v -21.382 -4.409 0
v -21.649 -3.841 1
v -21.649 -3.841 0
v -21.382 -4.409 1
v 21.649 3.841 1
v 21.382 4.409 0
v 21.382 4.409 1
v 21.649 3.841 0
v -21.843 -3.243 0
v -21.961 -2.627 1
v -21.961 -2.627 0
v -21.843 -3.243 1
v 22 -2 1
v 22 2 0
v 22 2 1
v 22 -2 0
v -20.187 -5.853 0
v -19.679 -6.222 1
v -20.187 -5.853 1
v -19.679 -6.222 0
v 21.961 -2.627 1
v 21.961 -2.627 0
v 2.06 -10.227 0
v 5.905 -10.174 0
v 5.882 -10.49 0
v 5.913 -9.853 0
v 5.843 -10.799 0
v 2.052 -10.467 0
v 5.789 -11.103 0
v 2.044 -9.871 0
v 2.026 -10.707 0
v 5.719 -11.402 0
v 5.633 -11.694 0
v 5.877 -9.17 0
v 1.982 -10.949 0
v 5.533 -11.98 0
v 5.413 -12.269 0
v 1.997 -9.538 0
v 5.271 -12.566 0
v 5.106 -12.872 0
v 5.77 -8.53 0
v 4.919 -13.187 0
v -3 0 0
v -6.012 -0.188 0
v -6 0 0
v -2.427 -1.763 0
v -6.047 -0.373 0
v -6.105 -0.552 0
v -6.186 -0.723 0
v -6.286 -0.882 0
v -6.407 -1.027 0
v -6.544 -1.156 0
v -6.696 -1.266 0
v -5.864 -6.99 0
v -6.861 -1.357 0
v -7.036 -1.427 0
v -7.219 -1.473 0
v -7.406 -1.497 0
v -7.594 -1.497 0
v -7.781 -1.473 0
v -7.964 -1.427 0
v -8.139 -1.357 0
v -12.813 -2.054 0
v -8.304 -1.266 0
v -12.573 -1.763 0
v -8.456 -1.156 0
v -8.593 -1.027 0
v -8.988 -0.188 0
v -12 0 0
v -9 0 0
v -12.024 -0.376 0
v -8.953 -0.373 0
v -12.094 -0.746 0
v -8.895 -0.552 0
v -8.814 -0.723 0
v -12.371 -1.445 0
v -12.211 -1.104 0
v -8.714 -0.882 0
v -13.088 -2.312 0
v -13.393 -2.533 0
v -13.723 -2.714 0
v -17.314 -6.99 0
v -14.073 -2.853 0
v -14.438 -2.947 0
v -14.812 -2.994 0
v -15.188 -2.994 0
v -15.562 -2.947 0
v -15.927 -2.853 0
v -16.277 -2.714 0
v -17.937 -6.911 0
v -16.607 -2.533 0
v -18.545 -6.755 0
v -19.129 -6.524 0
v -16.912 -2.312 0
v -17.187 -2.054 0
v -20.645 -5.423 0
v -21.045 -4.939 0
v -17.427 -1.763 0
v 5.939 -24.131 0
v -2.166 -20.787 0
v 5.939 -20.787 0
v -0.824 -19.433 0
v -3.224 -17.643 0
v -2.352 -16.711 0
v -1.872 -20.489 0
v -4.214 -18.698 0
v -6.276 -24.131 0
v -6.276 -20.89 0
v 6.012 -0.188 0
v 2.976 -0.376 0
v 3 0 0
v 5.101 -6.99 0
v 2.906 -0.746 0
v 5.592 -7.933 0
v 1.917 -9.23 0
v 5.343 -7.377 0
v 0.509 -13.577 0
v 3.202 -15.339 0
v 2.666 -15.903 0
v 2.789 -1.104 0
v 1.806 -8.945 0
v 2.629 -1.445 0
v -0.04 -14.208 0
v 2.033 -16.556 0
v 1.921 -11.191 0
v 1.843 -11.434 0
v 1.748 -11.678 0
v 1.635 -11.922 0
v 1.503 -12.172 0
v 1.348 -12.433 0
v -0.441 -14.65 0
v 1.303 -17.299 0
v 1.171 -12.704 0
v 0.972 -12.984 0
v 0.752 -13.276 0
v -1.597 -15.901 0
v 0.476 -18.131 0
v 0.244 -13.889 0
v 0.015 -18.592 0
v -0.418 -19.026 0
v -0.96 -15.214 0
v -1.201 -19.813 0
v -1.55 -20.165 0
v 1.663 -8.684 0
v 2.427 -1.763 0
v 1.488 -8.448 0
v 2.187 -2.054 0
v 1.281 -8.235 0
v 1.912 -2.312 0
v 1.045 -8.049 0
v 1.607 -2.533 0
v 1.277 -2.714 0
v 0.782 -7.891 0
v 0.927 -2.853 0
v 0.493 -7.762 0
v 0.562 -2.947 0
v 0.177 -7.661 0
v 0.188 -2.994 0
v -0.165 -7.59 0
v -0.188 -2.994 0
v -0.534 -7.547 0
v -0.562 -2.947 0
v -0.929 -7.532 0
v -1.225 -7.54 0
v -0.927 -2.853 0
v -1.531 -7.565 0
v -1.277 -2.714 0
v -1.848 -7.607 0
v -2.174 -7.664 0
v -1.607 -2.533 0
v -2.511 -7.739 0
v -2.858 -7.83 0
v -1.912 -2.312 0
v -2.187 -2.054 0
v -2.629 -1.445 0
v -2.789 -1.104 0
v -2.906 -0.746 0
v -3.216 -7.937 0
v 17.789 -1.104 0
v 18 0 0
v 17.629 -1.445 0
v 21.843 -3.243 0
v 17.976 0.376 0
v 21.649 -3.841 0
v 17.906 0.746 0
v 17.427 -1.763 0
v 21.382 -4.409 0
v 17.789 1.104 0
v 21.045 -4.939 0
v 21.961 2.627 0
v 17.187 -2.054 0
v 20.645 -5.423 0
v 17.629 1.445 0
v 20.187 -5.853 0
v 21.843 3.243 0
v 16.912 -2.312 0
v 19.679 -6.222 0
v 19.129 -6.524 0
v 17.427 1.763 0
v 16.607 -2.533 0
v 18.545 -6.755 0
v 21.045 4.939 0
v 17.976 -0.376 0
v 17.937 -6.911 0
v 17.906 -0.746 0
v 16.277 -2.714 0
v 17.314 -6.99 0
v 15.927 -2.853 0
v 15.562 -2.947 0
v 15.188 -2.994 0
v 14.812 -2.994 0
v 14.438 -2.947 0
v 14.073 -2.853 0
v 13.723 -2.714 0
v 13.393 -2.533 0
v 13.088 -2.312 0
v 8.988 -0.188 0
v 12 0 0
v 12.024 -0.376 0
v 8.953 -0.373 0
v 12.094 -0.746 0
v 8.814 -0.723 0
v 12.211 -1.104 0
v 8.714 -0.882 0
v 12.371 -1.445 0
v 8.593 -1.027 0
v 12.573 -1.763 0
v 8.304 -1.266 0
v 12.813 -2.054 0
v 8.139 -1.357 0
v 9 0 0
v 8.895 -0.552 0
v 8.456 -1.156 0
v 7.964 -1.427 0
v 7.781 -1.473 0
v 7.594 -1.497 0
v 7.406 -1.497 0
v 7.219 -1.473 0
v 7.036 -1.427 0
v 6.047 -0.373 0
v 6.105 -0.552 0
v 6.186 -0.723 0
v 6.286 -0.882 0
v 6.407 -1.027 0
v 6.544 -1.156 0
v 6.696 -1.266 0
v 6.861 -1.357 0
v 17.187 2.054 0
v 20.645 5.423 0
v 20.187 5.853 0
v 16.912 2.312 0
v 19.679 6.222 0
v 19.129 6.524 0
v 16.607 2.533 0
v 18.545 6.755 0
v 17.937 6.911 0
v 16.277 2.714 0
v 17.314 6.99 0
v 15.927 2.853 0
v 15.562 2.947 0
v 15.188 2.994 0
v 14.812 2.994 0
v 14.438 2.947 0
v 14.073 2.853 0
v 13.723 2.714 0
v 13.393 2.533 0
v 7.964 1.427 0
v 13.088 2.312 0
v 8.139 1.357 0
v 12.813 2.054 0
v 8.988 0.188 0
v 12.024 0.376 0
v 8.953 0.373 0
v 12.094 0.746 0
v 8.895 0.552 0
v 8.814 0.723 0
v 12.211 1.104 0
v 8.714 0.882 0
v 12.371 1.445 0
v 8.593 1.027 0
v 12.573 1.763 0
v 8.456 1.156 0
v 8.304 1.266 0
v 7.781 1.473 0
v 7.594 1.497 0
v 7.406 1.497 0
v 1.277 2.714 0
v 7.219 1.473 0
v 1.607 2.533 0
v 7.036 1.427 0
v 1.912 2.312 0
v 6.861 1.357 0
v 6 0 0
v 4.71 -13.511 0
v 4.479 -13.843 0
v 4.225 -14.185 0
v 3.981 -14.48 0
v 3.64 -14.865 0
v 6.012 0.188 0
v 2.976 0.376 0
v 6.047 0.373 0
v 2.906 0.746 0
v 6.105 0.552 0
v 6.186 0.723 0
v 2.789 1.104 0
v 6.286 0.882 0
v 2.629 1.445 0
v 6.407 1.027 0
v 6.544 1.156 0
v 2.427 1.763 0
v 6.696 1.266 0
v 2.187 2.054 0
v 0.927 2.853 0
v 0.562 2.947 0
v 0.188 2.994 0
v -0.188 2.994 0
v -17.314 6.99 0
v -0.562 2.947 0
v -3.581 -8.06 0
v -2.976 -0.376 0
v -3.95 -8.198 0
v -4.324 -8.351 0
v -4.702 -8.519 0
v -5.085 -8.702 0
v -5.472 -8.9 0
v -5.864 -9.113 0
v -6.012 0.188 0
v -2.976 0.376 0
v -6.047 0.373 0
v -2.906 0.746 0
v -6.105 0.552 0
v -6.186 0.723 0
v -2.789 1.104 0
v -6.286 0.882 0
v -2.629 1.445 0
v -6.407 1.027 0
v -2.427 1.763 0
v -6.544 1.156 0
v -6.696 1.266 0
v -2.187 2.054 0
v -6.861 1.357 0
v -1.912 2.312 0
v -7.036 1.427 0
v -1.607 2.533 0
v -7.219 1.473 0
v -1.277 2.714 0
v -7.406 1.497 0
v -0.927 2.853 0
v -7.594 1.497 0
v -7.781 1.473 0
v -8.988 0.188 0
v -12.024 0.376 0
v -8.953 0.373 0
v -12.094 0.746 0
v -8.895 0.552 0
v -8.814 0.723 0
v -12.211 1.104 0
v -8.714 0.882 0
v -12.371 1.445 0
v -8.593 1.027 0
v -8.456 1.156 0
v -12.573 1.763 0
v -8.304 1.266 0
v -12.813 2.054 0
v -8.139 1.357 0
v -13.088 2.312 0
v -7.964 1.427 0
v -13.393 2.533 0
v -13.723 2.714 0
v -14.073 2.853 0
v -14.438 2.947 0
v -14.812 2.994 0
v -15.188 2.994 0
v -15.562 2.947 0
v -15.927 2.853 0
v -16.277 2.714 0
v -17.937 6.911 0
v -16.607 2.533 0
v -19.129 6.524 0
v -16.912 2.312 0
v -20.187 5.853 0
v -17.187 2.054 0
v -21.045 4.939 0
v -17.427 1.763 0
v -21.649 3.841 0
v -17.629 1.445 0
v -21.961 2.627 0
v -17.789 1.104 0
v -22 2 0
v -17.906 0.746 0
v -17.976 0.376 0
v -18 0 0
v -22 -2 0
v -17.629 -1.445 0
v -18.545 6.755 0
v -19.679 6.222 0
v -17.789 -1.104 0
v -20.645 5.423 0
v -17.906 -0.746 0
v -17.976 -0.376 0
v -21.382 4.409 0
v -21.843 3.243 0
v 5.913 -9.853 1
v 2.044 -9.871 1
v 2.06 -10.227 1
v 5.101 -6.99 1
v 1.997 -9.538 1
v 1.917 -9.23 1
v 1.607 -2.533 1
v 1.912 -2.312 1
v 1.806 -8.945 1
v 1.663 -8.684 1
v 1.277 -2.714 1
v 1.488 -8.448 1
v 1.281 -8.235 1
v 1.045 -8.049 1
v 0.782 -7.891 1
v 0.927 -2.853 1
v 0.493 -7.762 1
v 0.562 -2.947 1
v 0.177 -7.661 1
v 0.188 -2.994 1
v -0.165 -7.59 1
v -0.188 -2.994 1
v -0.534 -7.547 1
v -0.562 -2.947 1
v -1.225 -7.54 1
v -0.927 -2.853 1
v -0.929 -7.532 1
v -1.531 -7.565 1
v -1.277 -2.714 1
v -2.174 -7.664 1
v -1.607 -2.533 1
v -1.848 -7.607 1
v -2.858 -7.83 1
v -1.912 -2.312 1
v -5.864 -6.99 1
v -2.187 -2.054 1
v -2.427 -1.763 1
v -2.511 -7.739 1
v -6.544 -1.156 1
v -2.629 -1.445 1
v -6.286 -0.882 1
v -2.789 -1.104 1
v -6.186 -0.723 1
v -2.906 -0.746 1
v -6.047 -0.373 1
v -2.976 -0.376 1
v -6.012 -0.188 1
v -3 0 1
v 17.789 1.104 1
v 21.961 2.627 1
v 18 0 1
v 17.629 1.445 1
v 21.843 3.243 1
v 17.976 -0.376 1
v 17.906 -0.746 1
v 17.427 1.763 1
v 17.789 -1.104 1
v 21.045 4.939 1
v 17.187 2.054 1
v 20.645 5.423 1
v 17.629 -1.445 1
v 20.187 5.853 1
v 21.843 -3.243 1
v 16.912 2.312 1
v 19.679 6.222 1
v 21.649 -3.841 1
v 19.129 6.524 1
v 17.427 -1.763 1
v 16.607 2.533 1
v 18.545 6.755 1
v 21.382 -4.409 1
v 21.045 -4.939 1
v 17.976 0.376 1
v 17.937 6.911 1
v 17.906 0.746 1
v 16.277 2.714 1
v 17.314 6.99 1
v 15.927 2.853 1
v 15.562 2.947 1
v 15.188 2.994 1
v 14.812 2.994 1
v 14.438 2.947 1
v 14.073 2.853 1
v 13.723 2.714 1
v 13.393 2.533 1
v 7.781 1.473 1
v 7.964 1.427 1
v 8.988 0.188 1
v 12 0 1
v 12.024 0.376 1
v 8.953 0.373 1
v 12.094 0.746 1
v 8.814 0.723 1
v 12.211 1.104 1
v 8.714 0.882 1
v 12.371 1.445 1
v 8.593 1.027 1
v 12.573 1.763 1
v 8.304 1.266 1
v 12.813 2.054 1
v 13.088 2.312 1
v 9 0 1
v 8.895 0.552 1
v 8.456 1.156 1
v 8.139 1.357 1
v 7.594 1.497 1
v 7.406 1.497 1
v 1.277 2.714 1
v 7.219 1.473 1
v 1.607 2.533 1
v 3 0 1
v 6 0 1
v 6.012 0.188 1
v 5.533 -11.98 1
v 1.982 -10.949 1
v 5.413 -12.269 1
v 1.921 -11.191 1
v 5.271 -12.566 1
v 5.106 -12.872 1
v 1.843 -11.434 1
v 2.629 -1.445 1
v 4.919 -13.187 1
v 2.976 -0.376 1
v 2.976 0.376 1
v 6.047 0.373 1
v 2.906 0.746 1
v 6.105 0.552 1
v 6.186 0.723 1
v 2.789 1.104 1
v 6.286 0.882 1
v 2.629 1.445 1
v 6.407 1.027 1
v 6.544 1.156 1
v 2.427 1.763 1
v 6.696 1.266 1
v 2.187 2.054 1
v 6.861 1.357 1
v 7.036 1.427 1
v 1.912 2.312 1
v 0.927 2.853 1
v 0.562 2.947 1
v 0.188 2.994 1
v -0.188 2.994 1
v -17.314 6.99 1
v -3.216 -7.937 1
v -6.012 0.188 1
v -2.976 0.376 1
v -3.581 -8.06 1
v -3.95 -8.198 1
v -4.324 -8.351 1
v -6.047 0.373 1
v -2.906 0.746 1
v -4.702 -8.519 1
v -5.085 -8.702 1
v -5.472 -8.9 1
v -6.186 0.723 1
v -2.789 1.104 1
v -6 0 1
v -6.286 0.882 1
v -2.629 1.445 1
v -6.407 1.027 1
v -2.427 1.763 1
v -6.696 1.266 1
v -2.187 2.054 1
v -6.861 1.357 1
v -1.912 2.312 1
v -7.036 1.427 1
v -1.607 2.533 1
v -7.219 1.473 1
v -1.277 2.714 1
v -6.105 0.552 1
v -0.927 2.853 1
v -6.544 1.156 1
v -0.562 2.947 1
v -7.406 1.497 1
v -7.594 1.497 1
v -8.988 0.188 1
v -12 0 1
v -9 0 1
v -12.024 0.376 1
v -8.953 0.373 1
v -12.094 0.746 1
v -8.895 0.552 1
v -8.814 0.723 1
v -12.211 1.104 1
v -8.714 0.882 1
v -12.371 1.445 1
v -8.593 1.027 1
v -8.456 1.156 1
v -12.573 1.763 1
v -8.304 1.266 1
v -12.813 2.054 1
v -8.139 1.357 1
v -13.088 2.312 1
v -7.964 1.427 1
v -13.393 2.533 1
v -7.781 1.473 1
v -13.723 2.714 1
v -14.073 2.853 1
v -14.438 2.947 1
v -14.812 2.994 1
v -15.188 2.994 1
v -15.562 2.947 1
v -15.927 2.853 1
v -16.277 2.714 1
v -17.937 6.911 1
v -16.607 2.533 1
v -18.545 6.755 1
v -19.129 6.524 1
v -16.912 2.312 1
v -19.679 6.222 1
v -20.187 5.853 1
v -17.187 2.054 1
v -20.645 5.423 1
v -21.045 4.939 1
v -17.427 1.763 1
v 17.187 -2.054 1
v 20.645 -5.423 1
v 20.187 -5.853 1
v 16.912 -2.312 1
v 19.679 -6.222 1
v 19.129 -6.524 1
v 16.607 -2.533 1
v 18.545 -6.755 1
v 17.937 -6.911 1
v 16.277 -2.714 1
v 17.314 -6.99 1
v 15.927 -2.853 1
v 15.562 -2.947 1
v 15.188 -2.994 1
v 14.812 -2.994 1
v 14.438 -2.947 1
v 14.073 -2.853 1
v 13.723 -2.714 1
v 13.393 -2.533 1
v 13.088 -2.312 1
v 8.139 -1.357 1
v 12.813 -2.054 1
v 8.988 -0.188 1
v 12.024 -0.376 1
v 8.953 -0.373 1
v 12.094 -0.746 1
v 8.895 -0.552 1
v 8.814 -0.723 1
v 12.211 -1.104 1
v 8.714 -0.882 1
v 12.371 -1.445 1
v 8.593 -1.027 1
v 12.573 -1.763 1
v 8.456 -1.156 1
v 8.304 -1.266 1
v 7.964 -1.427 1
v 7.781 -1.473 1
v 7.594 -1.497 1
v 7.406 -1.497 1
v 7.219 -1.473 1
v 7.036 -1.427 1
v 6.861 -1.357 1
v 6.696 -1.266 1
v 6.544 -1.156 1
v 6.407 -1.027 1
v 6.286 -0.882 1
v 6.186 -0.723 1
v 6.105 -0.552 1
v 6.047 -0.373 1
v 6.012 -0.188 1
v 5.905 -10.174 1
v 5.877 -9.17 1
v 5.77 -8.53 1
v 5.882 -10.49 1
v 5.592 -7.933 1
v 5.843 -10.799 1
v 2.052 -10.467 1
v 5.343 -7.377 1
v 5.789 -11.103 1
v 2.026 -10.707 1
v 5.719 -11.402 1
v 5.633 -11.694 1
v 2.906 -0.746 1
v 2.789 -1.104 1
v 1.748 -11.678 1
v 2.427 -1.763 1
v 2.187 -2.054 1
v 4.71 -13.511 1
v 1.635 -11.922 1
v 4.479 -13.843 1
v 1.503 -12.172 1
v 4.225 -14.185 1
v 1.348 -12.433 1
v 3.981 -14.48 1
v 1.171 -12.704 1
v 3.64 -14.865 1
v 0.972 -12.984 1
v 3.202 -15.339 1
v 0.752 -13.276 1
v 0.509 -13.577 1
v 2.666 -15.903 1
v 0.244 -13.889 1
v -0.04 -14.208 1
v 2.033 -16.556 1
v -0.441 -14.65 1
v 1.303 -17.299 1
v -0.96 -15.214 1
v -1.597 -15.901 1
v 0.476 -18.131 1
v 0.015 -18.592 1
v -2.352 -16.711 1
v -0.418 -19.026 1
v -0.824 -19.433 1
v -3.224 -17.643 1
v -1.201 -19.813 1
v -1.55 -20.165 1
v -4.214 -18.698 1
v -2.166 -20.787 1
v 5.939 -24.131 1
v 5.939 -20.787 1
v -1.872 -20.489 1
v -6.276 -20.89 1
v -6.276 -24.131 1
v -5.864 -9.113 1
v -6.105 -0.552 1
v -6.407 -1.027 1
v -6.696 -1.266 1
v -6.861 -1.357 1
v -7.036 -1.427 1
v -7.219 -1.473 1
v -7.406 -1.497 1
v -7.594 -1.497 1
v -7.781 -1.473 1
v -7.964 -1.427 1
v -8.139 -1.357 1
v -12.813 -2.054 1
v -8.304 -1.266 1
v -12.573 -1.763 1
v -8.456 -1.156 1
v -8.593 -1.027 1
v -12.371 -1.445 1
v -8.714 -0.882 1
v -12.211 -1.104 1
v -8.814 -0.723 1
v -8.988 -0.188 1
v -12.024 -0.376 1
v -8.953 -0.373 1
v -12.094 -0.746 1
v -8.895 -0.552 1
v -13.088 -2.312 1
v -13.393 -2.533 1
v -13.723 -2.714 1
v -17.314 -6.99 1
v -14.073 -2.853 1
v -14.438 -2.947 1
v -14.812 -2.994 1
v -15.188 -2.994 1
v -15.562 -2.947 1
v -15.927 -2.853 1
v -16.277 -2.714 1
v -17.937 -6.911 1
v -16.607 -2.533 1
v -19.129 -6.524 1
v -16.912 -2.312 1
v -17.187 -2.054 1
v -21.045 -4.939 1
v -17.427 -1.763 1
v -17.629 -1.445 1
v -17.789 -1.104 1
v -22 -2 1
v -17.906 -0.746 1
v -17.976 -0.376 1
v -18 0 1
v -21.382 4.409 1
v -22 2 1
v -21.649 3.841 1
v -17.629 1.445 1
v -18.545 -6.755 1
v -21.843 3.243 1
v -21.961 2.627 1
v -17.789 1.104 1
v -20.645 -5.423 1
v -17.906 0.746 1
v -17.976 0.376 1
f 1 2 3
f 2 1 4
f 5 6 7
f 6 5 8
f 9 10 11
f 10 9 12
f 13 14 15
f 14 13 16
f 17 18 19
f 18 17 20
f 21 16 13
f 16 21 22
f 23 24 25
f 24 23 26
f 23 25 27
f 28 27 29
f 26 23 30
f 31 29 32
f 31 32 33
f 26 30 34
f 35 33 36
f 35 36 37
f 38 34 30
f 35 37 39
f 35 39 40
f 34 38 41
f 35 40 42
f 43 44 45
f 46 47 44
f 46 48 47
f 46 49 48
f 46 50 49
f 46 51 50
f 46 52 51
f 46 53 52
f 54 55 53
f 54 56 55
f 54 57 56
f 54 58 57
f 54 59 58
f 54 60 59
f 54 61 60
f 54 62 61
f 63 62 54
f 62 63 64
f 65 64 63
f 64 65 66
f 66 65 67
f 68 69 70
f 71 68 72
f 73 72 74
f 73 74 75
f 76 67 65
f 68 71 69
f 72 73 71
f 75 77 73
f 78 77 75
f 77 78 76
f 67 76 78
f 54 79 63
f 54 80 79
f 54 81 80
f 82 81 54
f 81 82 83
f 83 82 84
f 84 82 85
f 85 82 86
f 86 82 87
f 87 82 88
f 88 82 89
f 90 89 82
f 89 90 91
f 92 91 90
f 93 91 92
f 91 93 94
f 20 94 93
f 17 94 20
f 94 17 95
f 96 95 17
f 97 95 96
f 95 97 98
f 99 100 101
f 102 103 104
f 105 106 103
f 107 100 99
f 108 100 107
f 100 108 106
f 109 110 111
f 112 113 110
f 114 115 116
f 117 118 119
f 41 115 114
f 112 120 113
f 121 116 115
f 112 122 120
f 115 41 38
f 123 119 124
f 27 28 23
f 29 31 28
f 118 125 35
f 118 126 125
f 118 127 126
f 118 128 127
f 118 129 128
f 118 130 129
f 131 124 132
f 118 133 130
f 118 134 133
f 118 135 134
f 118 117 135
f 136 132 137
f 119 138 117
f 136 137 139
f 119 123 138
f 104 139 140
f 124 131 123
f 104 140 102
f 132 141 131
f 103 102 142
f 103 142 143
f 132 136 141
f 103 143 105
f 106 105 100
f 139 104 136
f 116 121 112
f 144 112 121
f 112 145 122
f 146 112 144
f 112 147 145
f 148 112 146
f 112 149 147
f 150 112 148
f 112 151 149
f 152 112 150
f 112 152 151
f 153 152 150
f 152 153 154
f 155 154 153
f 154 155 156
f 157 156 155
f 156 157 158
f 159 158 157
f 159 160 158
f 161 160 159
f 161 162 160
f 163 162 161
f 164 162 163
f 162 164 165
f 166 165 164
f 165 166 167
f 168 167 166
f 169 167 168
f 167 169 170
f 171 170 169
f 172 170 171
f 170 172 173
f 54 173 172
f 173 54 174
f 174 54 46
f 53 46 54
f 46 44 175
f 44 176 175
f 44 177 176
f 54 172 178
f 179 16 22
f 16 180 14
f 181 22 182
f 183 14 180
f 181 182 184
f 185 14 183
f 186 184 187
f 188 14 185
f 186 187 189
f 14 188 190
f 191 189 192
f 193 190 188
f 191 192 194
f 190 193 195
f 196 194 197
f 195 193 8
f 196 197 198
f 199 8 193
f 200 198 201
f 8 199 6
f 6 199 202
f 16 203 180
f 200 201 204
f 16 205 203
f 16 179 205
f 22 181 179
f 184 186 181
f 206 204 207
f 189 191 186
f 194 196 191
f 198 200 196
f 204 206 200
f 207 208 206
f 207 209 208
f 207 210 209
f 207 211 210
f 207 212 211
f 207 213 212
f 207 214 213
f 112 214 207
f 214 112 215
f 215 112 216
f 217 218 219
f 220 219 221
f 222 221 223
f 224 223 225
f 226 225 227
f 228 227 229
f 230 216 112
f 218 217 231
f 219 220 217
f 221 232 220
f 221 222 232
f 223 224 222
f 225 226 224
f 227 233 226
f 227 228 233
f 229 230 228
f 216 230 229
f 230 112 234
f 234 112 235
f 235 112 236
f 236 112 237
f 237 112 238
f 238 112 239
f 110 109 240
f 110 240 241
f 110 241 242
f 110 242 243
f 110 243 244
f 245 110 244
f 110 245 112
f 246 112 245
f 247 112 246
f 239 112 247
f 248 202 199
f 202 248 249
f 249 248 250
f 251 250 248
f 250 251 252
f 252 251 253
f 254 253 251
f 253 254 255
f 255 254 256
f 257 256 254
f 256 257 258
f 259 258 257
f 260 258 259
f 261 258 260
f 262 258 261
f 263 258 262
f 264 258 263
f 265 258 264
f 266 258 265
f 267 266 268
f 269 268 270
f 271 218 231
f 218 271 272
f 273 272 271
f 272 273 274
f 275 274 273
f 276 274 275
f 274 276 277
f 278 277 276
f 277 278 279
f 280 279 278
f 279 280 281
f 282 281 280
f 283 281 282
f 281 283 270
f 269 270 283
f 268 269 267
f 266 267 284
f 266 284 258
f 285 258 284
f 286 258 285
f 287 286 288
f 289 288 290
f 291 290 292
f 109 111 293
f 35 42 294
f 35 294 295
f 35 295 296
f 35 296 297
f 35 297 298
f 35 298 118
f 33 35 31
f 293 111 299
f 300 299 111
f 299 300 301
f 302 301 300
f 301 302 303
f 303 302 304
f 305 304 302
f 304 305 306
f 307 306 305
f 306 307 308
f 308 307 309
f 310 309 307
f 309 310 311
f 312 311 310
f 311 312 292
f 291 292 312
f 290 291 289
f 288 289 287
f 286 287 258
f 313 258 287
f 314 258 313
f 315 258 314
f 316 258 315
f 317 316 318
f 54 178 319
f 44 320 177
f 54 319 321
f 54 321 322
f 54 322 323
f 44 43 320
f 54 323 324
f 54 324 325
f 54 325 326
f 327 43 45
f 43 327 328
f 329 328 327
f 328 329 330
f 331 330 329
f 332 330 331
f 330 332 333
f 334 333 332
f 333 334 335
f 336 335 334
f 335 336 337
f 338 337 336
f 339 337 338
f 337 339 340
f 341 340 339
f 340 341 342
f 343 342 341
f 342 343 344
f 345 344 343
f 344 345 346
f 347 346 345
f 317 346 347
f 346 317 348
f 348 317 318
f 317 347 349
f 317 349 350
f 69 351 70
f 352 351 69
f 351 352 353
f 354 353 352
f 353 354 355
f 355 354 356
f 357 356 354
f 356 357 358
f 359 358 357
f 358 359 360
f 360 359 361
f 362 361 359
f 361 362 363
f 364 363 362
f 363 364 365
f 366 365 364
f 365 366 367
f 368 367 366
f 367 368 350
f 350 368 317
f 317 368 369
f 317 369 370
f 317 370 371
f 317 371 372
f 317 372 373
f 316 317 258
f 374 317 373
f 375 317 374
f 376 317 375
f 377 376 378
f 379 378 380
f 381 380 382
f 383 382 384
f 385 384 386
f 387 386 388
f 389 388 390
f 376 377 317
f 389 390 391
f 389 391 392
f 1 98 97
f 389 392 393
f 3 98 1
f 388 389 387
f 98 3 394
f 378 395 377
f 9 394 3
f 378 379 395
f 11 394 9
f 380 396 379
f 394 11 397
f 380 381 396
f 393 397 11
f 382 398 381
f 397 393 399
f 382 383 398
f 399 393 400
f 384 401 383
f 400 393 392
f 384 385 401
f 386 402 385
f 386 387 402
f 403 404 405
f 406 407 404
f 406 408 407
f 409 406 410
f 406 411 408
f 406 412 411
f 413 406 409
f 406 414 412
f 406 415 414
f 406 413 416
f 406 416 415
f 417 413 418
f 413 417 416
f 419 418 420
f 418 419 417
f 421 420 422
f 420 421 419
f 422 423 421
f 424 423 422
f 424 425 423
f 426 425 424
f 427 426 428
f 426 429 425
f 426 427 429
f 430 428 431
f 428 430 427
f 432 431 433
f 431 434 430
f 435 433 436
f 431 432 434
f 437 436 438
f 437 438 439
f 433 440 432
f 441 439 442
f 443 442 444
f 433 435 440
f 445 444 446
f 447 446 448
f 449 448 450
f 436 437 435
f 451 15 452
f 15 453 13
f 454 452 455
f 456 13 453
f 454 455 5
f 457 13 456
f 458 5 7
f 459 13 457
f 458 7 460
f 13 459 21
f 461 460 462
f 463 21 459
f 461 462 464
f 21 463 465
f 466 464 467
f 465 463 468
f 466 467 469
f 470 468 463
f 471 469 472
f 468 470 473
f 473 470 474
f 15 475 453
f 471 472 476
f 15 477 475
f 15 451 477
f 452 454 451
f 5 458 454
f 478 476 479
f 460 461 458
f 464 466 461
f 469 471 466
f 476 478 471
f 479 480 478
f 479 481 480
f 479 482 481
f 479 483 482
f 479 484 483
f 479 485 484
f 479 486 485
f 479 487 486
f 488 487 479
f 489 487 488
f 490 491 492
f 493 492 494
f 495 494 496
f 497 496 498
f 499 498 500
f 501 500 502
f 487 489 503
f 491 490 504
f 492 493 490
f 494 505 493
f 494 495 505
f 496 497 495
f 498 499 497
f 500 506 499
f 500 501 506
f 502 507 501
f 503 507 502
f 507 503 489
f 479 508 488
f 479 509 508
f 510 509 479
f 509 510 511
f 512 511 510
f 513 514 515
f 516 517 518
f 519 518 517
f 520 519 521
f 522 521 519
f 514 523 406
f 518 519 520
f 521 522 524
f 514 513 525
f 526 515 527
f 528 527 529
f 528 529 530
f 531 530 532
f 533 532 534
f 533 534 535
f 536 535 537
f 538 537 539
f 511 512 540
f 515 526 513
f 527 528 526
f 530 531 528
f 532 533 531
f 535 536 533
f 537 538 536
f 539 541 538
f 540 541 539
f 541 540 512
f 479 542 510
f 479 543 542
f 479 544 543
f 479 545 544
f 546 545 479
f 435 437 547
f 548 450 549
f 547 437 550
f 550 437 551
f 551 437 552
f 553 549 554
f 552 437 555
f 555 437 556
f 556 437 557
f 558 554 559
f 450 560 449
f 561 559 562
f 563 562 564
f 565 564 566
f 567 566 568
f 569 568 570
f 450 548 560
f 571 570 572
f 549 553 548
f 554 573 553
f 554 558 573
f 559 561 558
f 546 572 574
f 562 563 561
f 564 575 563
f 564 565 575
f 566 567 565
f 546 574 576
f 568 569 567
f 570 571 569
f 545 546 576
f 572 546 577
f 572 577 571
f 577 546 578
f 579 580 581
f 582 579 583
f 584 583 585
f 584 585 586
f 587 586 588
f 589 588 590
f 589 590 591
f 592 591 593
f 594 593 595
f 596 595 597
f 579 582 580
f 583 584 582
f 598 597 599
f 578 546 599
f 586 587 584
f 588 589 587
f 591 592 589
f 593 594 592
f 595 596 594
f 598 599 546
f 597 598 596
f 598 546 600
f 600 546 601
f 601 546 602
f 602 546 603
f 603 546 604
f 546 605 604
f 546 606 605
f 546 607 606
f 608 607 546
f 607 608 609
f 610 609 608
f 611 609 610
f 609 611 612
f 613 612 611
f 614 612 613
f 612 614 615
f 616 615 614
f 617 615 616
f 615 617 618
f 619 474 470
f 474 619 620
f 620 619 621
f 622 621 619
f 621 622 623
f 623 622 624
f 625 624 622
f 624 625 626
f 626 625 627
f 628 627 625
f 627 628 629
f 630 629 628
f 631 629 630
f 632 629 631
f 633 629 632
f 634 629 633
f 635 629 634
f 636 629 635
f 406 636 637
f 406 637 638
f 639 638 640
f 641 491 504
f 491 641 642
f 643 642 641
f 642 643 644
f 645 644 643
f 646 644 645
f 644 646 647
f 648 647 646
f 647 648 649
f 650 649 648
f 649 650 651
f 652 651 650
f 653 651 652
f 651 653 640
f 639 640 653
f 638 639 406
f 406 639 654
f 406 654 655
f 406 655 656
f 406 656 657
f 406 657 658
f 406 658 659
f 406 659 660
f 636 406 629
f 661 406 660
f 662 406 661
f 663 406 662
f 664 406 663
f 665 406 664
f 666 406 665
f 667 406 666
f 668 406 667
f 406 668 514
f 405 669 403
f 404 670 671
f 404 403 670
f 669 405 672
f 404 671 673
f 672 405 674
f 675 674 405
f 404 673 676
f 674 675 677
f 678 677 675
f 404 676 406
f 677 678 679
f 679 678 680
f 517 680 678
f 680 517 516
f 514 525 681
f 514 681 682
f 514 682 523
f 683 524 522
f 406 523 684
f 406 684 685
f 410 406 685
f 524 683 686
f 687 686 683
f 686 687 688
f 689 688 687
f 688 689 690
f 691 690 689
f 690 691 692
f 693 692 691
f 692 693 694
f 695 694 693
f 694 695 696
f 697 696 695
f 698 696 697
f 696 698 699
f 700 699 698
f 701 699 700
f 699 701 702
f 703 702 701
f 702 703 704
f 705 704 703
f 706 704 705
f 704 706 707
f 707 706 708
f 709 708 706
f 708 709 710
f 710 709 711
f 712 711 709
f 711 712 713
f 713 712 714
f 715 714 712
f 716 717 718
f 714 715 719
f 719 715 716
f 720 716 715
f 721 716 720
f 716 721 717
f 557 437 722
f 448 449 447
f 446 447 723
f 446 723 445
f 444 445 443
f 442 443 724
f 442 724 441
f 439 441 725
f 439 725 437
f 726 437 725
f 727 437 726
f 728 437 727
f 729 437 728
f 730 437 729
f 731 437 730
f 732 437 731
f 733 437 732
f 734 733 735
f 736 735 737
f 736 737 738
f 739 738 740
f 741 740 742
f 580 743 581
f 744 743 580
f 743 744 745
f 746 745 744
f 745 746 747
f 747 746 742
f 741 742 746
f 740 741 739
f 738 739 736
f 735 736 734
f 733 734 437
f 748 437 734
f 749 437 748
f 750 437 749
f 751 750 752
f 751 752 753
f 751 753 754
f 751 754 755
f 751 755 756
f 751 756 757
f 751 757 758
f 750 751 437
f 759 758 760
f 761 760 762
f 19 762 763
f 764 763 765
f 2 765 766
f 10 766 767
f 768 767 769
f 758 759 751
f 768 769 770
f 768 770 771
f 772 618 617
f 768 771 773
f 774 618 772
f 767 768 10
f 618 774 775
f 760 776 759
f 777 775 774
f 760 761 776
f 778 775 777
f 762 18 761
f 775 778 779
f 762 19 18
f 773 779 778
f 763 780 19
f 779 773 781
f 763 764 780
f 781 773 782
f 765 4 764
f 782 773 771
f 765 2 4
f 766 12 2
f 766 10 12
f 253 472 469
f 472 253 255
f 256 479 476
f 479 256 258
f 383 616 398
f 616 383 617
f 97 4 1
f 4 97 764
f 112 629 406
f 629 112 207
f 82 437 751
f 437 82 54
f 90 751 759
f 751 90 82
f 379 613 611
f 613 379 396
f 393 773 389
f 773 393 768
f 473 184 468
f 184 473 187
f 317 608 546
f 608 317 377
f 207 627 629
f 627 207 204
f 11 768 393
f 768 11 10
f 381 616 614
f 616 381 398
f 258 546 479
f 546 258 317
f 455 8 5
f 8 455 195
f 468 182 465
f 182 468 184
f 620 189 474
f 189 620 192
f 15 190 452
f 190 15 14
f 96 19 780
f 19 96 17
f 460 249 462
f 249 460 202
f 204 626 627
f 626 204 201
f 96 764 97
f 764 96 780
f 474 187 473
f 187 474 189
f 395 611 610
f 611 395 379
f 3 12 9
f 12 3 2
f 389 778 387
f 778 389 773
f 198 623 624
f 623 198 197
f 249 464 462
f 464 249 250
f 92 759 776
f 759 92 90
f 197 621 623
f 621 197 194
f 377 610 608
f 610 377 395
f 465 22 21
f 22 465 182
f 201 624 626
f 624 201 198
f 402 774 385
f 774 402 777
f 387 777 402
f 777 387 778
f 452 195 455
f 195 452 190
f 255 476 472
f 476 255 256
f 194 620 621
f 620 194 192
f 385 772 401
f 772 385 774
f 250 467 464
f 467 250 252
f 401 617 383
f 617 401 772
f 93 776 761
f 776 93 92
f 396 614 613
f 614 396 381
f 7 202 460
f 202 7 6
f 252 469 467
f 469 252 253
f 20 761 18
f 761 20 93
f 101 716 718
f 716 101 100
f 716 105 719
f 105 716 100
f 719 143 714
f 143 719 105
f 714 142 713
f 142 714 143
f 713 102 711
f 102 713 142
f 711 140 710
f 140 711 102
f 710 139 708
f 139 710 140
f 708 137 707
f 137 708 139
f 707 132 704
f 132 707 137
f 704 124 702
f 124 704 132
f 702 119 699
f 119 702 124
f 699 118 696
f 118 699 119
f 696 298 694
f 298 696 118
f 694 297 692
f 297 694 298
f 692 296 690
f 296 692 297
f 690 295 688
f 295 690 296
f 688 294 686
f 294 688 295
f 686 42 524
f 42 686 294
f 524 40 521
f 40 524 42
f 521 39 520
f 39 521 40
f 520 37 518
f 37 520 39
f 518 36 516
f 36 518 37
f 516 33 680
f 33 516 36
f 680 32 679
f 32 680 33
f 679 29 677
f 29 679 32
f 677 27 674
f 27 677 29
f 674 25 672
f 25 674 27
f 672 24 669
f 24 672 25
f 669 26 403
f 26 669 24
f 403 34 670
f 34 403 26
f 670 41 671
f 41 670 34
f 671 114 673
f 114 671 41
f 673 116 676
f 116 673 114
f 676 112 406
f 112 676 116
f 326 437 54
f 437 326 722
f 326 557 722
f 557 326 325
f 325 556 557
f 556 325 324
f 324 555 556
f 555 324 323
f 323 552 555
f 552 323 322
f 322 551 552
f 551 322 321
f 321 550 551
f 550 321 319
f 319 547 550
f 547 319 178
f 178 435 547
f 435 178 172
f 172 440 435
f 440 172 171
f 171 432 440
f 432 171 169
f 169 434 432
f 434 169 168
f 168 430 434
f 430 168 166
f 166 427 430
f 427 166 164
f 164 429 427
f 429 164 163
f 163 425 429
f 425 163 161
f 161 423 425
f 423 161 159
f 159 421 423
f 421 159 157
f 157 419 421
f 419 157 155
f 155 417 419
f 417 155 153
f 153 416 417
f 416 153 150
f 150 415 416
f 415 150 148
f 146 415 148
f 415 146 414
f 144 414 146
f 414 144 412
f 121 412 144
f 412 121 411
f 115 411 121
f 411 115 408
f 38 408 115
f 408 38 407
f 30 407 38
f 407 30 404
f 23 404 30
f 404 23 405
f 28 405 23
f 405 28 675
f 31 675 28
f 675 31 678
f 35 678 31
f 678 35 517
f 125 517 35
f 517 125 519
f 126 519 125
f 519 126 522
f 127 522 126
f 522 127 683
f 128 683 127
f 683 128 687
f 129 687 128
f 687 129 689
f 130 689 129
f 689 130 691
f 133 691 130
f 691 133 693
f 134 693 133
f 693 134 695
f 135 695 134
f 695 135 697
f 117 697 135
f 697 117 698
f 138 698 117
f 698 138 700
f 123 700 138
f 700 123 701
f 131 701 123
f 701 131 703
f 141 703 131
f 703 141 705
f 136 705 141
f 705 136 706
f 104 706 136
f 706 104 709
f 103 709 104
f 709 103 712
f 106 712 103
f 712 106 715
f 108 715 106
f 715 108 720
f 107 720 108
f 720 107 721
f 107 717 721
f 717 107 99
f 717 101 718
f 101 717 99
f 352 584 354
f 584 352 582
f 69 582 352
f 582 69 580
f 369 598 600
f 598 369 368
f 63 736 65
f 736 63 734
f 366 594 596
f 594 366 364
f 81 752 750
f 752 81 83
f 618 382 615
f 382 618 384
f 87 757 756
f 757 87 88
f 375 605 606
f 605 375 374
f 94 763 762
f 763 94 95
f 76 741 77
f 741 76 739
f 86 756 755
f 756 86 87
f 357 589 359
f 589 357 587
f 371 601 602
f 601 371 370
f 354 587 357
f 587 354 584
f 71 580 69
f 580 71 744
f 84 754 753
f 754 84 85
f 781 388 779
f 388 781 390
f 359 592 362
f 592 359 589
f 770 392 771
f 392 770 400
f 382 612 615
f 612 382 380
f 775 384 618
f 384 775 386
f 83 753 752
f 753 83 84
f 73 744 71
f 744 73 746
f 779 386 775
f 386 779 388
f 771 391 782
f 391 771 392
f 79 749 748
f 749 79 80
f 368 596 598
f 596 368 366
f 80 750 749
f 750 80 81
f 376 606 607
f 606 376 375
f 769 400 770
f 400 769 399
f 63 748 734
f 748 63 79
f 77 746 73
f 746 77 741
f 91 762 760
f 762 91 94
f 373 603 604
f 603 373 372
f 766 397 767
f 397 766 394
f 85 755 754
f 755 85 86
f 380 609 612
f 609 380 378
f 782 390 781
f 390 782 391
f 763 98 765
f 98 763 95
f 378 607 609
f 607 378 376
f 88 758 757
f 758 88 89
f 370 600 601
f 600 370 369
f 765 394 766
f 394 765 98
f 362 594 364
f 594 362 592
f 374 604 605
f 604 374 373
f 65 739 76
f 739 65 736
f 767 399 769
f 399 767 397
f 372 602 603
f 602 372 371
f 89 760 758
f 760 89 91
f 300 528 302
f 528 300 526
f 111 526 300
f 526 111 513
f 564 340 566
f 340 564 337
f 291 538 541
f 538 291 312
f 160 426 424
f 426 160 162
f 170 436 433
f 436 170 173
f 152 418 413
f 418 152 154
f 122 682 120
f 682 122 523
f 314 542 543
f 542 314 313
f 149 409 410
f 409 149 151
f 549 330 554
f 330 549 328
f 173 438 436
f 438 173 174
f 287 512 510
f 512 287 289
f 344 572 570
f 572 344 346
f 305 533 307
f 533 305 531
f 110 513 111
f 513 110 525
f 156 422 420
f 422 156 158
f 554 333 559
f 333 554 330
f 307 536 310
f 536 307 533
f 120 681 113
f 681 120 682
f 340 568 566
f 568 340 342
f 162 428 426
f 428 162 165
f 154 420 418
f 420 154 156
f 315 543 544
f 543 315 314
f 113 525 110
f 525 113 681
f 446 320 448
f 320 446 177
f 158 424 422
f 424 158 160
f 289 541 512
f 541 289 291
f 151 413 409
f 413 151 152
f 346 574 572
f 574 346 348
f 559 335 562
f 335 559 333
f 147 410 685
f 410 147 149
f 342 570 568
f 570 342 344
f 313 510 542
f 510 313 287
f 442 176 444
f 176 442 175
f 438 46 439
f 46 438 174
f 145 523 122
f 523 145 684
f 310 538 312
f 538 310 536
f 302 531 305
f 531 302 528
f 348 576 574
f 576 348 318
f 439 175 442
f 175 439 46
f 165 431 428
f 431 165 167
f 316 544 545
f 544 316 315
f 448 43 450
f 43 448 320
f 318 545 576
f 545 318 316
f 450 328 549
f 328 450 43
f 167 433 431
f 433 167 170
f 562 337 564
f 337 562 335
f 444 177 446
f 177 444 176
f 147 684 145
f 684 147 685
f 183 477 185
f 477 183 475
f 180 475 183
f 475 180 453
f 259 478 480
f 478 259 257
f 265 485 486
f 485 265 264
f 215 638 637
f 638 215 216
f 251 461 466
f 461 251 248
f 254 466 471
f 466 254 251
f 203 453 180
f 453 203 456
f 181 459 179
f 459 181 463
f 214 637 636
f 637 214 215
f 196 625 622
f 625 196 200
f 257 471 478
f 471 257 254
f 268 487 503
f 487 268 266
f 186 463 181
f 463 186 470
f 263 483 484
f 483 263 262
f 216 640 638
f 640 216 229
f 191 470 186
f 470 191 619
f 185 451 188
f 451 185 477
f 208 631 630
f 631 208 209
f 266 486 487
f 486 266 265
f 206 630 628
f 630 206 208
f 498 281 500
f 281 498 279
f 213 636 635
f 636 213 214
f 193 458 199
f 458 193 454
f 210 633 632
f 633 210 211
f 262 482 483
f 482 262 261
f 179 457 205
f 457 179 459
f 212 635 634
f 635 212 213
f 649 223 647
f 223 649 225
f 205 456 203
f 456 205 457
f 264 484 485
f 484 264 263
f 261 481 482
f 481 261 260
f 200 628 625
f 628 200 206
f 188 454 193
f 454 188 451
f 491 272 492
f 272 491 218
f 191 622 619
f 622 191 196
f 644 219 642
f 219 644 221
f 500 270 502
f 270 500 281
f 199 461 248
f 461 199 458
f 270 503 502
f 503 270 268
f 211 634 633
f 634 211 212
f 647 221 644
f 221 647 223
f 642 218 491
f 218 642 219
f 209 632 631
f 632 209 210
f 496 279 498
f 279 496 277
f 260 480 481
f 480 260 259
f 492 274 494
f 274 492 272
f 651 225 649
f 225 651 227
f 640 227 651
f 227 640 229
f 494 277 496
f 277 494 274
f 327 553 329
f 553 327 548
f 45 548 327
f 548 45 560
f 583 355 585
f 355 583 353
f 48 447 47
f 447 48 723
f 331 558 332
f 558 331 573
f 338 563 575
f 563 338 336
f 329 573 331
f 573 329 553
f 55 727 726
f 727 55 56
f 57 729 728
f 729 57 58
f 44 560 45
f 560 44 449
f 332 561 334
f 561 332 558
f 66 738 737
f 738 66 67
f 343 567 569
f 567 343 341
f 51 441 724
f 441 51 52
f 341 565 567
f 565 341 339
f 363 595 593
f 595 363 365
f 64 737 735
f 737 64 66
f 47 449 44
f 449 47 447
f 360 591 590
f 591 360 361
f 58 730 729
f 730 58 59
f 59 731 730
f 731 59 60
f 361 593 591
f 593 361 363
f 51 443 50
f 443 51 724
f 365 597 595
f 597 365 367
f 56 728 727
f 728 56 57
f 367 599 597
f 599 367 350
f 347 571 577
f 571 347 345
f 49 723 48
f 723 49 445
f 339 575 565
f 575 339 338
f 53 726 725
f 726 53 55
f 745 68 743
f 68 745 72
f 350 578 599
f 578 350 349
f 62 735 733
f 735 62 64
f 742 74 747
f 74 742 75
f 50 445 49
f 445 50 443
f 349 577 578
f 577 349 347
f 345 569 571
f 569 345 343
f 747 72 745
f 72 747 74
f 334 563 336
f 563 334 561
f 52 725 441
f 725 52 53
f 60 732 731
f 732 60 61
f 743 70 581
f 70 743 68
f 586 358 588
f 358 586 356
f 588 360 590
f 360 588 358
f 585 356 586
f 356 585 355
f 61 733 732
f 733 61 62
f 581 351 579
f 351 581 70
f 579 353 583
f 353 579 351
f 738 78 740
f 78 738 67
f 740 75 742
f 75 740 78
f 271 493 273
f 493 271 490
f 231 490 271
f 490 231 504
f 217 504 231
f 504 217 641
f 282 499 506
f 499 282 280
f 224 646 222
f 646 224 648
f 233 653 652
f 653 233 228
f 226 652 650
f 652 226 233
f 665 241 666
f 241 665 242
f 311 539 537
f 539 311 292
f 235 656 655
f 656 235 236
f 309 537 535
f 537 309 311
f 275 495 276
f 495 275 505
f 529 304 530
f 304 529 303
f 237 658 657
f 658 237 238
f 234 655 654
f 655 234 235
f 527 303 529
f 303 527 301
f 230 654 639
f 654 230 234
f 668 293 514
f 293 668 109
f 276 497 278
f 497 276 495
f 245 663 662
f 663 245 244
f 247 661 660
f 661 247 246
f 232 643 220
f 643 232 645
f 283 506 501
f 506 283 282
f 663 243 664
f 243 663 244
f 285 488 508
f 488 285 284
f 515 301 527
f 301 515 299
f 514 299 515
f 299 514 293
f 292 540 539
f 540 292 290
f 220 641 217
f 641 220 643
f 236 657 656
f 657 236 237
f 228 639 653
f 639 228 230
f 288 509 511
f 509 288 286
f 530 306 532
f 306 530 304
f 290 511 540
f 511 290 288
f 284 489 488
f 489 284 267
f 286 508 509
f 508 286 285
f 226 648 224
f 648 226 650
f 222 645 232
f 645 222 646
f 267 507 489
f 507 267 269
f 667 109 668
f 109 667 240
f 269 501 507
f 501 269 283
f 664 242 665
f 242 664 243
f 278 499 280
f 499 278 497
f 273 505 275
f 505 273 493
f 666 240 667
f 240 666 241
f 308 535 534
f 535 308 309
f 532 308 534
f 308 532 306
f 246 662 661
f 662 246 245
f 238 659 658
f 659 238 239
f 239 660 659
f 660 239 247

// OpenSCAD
$fn = 50;


difference() {
	union() {
		*color(alpha = 1.0000000000, c = "gray") {
			translate(v = [0, 14, 0]) {
				linear_extrude(height = 1) {
					text(font = "Arial:style=Bold", halign = "center", size = 4.5000000000, text = "COMMENT description oobb_plate_shape_p_type_1_depth_3_width_1_thickness_2_extra_oobb_size", valign = "center");
				}
			}
		}
		hull() {
			translate(v = [-17.0000000000, 2.0000000000, 0]) {
				cylinder(h = 1, r = 5);
			}
			translate(v = [17.0000000000, 2.0000000000, 0]) {
				cylinder(h = 1, r = 5);
			}
			translate(v = [-17.0000000000, -2.0000000000, 0]) {
				cylinder(h = 1, r = 5);
			}
			translate(v = [17.0000000000, -2.0000000000, 0]) {
				cylinder(h = 1, r = 5);
			}
		}
		translate(v = [0, -5, 0]) {
			linear_extrude(height = 1) {
				text(font = "DejaVu Sans Mono:style=Bold", halign = "center", size = 19.0000000000, text = "2", valign = "top");
			}
		}
	}
	union() {
		*color(alpha = 1.0000000000, c = "gray") {
			translate(v = [0, 14, 0]) {
				linear_extrude(height = 1) {
					text(font = "Arial:style=Bold", halign = "center", size = 4.5000000000, text = "COMMENT description oobb_holes_shape_n_type_3_width_1_thickness_2_extra_oobb_size_1_height_'all'_holes_true_both_holes", valign = "center");
				}
			}
		}
		translate(v = [-15.0000000000, 0.0000000000, 0]) {
			translate(v = [0, 0, -50]) {
				cylinder(h = 100, r = 3.0000000000);
			}
		}
		translate(v = [0, 0, -50]) {
			cylinder(h = 100, r = 3.0000000000);
		}
		translate(v = [15.0000000000, 0.0000000000, 0]) {
			translate(v = [0, 0, -50]) {
				cylinder(h = 100, r = 3.0000000000);
			}
		}
		translate(v = [-15.0000000000, 0.0000000000, 0]) {
			translate(v = [0, 0, -50]) {
				cylinder(h = 100, r = 1.5000000000);
			}
		}
		translate(v = [-7.5000000000, 0.0000000000, 0]) {
			translate(v = [0, 0, -50]) {
				cylinder(h = 100, r = 1.5000000000);
			}
		}
		translate(v = [0, 0, -50]) {
			cylinder(h = 100, r = 1.5000000000);
		}
		translate(v = [7.5000000000, 0.0000000000, 0]) {
			translate(v = [0, 0, -50]) {
				cylinder(h = 100, r = 1.5000000000);
			}
		}
		translate(v = [15.0000000000, 0.0000000000, 0]) {
			translate(v = [0, 0, -50]) {
				cylinder(h = 100, r = 1.5000000000);
			}
		}
	}
}
